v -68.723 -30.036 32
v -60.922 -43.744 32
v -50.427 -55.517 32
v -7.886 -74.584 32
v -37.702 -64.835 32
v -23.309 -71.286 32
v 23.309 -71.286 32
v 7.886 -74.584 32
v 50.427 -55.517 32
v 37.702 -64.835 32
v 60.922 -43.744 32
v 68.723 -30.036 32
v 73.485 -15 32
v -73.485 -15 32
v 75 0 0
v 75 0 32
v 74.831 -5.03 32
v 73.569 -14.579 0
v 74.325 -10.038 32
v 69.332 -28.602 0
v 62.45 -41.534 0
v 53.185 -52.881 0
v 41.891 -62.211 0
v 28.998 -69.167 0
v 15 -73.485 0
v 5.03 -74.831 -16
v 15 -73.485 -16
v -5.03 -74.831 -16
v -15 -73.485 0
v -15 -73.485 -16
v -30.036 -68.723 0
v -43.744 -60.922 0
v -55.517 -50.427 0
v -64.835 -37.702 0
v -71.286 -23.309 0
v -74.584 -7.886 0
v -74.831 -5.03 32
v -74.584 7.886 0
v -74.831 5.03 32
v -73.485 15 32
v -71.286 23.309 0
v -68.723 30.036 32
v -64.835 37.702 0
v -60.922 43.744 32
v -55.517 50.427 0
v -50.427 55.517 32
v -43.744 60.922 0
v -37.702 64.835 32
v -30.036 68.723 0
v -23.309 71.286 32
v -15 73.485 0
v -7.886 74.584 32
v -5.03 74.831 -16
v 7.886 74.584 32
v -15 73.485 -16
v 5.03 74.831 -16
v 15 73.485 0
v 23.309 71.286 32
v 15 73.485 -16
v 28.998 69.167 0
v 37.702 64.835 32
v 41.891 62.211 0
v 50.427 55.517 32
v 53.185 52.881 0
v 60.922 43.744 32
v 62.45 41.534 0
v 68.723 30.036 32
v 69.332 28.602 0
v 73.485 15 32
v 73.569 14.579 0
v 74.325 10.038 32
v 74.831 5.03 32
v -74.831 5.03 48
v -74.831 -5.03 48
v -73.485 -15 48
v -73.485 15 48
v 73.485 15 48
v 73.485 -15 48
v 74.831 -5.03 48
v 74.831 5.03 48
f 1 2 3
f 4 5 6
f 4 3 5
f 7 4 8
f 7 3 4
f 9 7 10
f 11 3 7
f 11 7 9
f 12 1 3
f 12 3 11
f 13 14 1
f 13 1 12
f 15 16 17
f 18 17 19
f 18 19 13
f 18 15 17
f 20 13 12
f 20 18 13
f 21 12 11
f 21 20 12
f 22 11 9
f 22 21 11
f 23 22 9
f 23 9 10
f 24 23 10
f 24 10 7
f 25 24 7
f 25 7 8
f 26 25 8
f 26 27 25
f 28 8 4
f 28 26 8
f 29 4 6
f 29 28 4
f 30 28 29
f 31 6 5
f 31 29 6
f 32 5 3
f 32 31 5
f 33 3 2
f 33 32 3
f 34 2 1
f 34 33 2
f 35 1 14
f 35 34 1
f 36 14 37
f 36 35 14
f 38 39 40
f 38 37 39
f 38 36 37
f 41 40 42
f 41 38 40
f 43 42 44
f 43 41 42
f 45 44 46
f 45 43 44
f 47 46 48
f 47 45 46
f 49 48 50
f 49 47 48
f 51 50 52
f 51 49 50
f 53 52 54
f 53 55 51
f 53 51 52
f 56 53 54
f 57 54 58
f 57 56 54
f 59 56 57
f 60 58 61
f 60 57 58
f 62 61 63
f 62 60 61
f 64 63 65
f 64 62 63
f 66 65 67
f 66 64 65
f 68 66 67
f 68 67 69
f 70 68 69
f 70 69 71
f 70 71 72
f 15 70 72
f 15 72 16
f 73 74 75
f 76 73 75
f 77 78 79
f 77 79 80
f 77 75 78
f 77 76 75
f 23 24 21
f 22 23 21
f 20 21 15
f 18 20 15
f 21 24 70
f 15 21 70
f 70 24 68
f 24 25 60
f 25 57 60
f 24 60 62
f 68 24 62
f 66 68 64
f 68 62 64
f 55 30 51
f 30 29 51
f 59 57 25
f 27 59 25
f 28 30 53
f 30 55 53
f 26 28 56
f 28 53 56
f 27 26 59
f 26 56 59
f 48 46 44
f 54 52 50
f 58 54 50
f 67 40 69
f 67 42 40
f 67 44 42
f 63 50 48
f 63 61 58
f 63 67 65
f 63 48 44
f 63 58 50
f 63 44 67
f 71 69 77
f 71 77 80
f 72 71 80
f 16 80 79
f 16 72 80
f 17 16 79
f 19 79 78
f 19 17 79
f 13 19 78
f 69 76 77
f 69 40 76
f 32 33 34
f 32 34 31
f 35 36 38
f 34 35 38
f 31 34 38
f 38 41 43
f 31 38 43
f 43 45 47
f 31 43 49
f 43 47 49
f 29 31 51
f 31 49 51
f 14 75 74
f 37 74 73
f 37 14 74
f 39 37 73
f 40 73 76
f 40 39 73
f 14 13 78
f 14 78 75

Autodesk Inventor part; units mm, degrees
ref_plane "YZ Plane" through (0, 0, 0) normal (1, 0, 0) x (0, 1, 0)
ref_plane "XZ Plane" through (0, 0, 0) normal (0, 1, 0) x (-1, 0, 0)
ref_plane "XY Plane" through (0, 0, 0) normal (0, 0, 1) x (1, 0, 0)
sketch "Sketch1" plane through (0, 0, 0) normal (0, 0, 1) x (1, 0, 0)
  circle A0 centre (0, 0) radius 75
  line L0 (15, 73.4847) -> (15, -73.4847)
  line L1 (-15, -73.4847) -> (-15, 73.4847)
  dimension "d0" = 150
  dimension "d2" = 15
extrude "Extrusion1" add sketch "Sketch1" against normal blind 16 contours L0 A0 L1
sketch "Sketch2" plane through (0, 0, 0) normal (0, 0, 1) x (1, 0, 0)
  circle A0 centre (0, 0) radius 75
extrude "Extrusion2" add sketch "Sketch2" along normal blind 32
sketch "Sketch3" plane through (0, 0, 32) normal (0, 0, 1) x (1, 0, 0)
  line L0 (-75, 15) -> (75, 15)
  line L1 (75, 15) -> (75, -15)
  line L2 (75, -15) -> (-75, -15)
  line L3 (-75, -15) -> (-75, 15)
  point P0 (0, 0)
  dimension "d7" = 30
  dimension "d8" = 15
  dimension "d9" = 75
  dimension "d10" = 75
extrude "Extrusion3" cut sketch "Sketch3" along normal blind 32
sketch "Sketch4" plane through (0, 0, 32) normal (0, 0, 1) x (1, 0, 0)
  line L0 (-73.4847, 15) -> (73.4847, 15)
  line L1 (73.4847, -15) -> (-73.4847, -15)
  arc A0 (-73.4847, 15) -> (-73.4847, -15) centre (0, 0) ccw
  arc A1 (73.4847, -15) -> (73.4847, 15) centre (0, 0) ccw
extrude "Extrusion4" add sketch "Sketch4" along normal blind 16
equation "\"d2\" = 0.5 * d1"
equation "\"d8\" = 0.5 * d7"
equation "\"d1\" = 30"
